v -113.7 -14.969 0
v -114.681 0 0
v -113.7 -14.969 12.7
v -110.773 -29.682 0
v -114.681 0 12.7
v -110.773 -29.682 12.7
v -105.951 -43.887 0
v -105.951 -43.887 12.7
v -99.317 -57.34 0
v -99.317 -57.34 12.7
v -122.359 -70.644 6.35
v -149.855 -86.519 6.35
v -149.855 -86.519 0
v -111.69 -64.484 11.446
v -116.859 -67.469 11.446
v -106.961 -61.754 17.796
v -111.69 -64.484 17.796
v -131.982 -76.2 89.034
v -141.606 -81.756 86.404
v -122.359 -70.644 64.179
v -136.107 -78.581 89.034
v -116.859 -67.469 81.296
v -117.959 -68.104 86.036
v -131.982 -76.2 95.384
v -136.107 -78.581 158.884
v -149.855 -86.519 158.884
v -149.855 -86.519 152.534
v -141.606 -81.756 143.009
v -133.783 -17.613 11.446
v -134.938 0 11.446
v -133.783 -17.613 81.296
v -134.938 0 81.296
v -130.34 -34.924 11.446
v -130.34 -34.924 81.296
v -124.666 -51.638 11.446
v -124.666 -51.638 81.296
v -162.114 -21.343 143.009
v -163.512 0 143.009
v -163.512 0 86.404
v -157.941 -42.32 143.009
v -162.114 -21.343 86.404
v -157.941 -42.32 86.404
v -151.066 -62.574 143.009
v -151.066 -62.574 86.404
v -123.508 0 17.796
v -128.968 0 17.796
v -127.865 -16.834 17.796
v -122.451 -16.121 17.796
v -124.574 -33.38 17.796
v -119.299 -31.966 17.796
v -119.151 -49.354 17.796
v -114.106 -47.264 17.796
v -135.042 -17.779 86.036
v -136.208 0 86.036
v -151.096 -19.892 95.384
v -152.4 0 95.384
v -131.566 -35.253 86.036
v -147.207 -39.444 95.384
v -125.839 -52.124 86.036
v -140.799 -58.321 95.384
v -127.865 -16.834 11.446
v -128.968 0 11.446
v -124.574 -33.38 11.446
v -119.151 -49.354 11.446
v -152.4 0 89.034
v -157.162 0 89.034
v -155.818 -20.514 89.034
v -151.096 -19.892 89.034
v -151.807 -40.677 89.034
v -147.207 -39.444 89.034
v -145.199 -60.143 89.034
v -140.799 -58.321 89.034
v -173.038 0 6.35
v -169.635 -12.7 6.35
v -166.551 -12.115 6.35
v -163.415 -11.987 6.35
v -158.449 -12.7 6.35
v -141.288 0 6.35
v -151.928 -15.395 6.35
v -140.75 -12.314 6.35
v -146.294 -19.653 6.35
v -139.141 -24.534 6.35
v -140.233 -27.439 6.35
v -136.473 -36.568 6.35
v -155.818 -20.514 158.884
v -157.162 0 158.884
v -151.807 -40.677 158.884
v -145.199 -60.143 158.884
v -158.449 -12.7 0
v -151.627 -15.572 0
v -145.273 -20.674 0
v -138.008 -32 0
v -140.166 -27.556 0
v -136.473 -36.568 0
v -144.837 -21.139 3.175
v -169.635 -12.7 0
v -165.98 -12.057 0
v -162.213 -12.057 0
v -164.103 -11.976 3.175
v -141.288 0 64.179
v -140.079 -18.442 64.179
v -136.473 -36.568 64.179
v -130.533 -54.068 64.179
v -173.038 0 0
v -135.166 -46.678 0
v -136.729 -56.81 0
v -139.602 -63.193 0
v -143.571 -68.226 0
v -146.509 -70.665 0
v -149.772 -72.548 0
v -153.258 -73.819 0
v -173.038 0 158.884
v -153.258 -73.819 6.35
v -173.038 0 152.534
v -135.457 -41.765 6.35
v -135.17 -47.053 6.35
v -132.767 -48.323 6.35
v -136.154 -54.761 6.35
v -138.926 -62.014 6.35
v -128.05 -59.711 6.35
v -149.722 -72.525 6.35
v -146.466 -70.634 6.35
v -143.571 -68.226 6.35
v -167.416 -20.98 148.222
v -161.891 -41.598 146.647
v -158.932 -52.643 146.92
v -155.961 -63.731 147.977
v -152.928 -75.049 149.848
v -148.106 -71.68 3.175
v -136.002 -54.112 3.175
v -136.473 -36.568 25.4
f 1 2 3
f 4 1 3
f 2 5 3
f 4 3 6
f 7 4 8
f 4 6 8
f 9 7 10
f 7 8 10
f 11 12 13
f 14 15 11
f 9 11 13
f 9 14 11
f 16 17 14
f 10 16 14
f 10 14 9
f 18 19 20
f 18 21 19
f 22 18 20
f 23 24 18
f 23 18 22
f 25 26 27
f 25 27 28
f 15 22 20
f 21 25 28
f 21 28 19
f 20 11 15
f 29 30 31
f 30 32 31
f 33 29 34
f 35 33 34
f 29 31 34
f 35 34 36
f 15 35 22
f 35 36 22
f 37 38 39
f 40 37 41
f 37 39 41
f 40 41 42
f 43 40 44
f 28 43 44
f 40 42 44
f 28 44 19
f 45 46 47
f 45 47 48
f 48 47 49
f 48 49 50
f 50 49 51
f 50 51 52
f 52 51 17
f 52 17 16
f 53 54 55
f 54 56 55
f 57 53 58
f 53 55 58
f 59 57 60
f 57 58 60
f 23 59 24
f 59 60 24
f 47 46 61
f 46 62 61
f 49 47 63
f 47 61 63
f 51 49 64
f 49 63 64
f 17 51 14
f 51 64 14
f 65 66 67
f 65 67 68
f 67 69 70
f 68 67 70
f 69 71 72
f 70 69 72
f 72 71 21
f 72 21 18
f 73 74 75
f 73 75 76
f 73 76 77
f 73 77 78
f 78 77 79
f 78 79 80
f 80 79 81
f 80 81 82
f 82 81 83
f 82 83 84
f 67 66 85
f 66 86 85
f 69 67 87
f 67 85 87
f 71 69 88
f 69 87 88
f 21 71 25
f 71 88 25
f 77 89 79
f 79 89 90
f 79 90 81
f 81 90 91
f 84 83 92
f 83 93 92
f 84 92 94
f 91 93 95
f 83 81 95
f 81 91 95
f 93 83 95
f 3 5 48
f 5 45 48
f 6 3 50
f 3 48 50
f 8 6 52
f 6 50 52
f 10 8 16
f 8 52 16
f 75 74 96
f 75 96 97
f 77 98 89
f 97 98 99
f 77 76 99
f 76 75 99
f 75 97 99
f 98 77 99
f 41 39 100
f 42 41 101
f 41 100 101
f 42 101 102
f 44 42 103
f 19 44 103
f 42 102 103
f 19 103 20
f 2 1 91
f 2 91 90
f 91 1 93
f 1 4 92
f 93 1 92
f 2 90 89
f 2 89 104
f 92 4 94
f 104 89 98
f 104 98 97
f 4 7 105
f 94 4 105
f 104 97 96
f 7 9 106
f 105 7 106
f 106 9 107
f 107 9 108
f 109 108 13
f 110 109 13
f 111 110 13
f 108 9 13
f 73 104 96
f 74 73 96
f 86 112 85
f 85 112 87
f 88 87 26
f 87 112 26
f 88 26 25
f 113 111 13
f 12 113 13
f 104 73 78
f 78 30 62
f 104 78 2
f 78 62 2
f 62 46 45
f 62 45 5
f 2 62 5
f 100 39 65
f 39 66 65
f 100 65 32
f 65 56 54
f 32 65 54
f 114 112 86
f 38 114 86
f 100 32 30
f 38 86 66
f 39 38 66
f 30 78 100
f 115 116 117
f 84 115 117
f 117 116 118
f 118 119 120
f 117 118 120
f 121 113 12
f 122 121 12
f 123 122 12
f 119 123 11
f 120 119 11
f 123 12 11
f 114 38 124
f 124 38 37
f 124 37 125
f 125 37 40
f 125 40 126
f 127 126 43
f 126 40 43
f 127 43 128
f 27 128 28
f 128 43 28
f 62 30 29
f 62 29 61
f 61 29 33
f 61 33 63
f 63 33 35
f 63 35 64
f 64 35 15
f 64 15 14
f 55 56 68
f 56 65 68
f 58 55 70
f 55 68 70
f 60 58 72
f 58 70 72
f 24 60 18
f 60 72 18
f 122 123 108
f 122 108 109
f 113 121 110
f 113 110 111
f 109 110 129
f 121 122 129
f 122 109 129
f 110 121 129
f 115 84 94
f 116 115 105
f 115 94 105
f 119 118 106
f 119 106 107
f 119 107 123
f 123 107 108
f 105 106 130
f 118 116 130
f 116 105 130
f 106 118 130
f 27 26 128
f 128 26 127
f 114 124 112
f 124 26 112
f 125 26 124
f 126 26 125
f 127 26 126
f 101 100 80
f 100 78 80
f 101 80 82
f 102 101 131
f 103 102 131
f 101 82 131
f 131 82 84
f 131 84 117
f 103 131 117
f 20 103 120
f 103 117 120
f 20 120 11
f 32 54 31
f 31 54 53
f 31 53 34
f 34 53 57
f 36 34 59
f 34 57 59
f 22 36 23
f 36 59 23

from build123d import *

# Parameters (mm, degrees)
F1_ANGLE = 30
F3_DEPTH = 25.4
F5_DEPTH = 25.4


with BuildPart() as f1:
    # F0 (on Front) → F1 (revolve)
    with BuildSketch(Plane.XZ):
        Polygon((-173.0375, 6.35), (-173.0375, 0), (-114.681, 0), (-114.681, 12.7), (-123.5075, 17.795982151), (-128.9685, 17.795982151), (-128.9685, 11.445982151), (-134.9375, 11.445982151), (-134.9375, 81.295982151), (-136.2075, 86.0356866766), (-152.4, 95.3844309105), (-152.4, 89.0344309105), (-157.1625, 89.0344309105), (-157.1625, 158.8844309105), (-173.0375, 158.8844309105), (-173.0375, 152.5344309105), (-163.5125, 143.0094309105), (-163.5125, 86.4041747894), (-141.2875, 64.1791747894), (-141.2875, 6.35), align=None)
    revolve(axis=Axis((0, 0, 96.6527089477), (0, 0, 1)), revolution_arc=F1_ANGLE)

    # F2 (on face) → F3 (cut)
    with BuildSketch(Plane(origin=(0, 0, 0), x_dir=(1, 0, 0), z_dir=(0, 0, -1))):
        with BuildLine():
            Line((-182.2236834316, 21.7005722844), (-168.6606251651, 72.3185948408))
            add(Edge.make_bspline(
                [(-168.6606251651, 72.3185948408), (-206.0052829566, 55.1989492048), (-182.2236834316, 21.7005722844)],
                knots=[0.5949234727, 0.5949234727, 0.5949234727, 2.5466691809, 2.5466691809, 2.5466691809], degree=2, weights=[1, 0.5604453769, 1]))
        make_face()
        with BuildLine():
            add(Edge.make_bspline(
                [(-143.5710023784, 68.2260600336), (-147.7895884166, 72.3535402758), (-153.2578255512, 73.81875)],
                knots=[5.8520567138, 5.8520567138, 5.8520567138, 6.2831853072, 6.2831853072, 6.2831853072], degree=2, weights=[1, 0.9768558474, 1]))
            Line((-153.2578255512, 73.81875), (-143.5710023784, 68.2260600336))
        make_face()
        with BuildLine():
            Line((-158.4491653232, 12.7), (-169.6345452561, 12.7))
            add(Edge.make_bspline(
                [(-169.6345452561, 12.7), (-164.1663081215, 11.2347902758), (-158.4491653232, 12.7)],
                knots=[3.1415926536, 3.1415926536, 3.1415926536, 3.572721247, 3.572721247, 3.572721247], degree=2, weights=[1, 0.9768558474, 1]))
        make_face()
        with BuildLine():
            Line((-143.5710023784, 68.2260600336), (-153.2578255512, 73.81875))
            Line((-153.2578255512, 73.81875), (-169.6345452561, 12.7))
            Line((-169.6345452561, 12.7), (-158.4491653232, 12.7))
            add(Edge.make_bspline(
                [(-158.4491653232, 12.7), (-141.7198075312, 16.987459415), (-136.4732452884, 36.5678954371)],
                knots=[3.572721247, 3.572721247, 3.572721247, 4.7123889674, 4.7123889674, 4.7123889674], degree=2, weights=[1, 0.8419906179, 1]))
            add(Edge.make_bspline(
                [(-136.4732452884, 36.5678954371), (-131.2266828952, 56.1483320204), (-143.5710023784, 68.2260600336)],
                knots=[4.7123889674, 4.7123889674, 4.7123889674, 5.8520567138, 5.8520567138, 5.8520567138], degree=2, weights=[1, 0.8419906109, 1]))
        make_face()
        with BuildLine():
            ThreePointArc((-173.0375, 0), (-172.9018353284, 6.8506748809), (-172.4950540409, 13.6906076446))
            add(Edge.make_bspline(
                [(-182.2236834316, 21.7005722844), (-178.3035736311, 16.1787689453), (-172.4950540409, 13.6906076446)],
                knots=[2.5466691809, 2.5466691809, 2.5466691809, 3.0245373947, 3.0245373947, 3.0245373947], degree=2, weights=[1, 0.9715907886, 1]))
            Line((-182.2236834316, 21.7005722844), (-188.0383342505, 0))
            Line((-188.0383342505, 0), (-173.0375, 0))
        make_face()
        with BuildLine():
            ThreePointArc((-156.2304026489, 74.391113007), (-153.1627191958, 80.5180591843), (-149.8548708073, 86.51875))
            Line((-149.8548708073, 86.51875), (-162.8085898503, 94.1586879635))
            Line((-162.8085898503, 94.1586879635), (-168.6606251651, 72.3185948408))
            add(Edge.make_bspline(
                [(-156.2304026489, 74.391113007), (-162.5048088227, 75.140561907), (-168.6606251651, 72.3185948408)],
                knots=[0.1170552589, 0.1170552589, 0.1170552589, 0.5949234727, 0.5949234727, 0.5949234727], degree=2, weights=[1, 0.9715907886, 1]))
        make_face()
        with BuildLine():
            Line((-153.2578255512, 73.81875), (-149.8548708073, 86.51875))
            ThreePointArc((-149.8548708073, 86.51875), (-153.1627191958, 80.5180591843), (-156.2304026489, 74.391113007))
            add(Edge.make_bspline(
                [(-153.2578255512, 73.81875), (-154.7211037363, 74.210834208), (-156.2304026489, 74.391113007)],
                knots=[0, 0, 0, 0.1170552589, 0.1170552589, 0.1170552589], degree=2, weights=[1, 0.9982877472, 1]))
        make_face()
        with BuildLine():
            Line((-173.0375, 0), (-169.6345452561, 12.7))
            add(Edge.make_bspline(
                [(-172.4950540409, 13.6906076446), (-171.0978234412, 13.092084208), (-169.6345452561, 12.7)],
                knots=[3.0245373947, 3.0245373947, 3.0245373947, 3.1415926536, 3.1415926536, 3.1415926536], degree=2, weights=[1, 0.9982877472, 1]))
            ThreePointArc((-172.4950540409, 13.6906076446), (-172.9018353284, 6.8506748809), (-173.0375, 0))
        make_face()
        with BuildLine():
            Line((-169.6345452561, 12.7), (-153.2578255512, 73.81875))
            add(Edge.make_bspline(
                [(-153.2578255512, 73.81875), (-154.7211037363, 74.210834208), (-156.2304026489, 74.391113007)],
                knots=[0, 0, 0, 0.1170552589, 0.1170552589, 0.1170552589], degree=2, weights=[1, 0.9982877472, 1]))
            ThreePointArc((-156.2304026489, 74.391113007), (-167.1413901665, 44.7854005169), (-172.4950540409, 13.6906076446))
            add(Edge.make_bspline(
                [(-172.4950540409, 13.6906076446), (-171.0978234412, 13.092084208), (-169.6345452561, 12.7)],
                knots=[3.0245373947, 3.0245373947, 3.0245373947, 3.1415926536, 3.1415926536, 3.1415926536], degree=2, weights=[1, 0.9982877472, 1]))
        make_face()
        with BuildLine():
            ThreePointArc((-172.4950540409, 13.6906076446), (-167.1413901665, 44.7854005169), (-156.2304026489, 74.391113007))
            add(Edge.make_bspline(
                [(-156.2304026489, 74.391113007), (-162.5048088227, 75.140561907), (-168.6606251651, 72.3185948408)],
                knots=[0.1170552589, 0.1170552589, 0.1170552589, 0.5949234727, 0.5949234727, 0.5949234727], degree=2, weights=[1, 0.9715907886, 1]))
            Line((-168.6606251651, 72.3185948408), (-182.2236834316, 21.7005722844))
            add(Edge.make_bspline(
                [(-182.2236834316, 21.7005722844), (-178.3035736311, 16.1787689453), (-172.4950540409, 13.6906076446)],
                knots=[2.5466691809, 2.5466691809, 2.5466691809, 3.0245373947, 3.0245373947, 3.0245373947], degree=2, weights=[1, 0.9715907886, 1]))
        make_face()
    extrude(amount=-F3_DEPTH, mode=Mode.SUBTRACT)

    # F4 (on face) → F5 (cut)
    with BuildSketch(Plane.XY.offset(158.8844309105)):
        Polygon((-149.8548708073, -86.51875), (-173.0375, 0), (-187.3384565115, -4.9058394507), (-165.3621643782, -86.51875), align=None)
    extrude(amount=-F5_DEPTH, mode=Mode.SUBTRACT)


solid = f1.part
